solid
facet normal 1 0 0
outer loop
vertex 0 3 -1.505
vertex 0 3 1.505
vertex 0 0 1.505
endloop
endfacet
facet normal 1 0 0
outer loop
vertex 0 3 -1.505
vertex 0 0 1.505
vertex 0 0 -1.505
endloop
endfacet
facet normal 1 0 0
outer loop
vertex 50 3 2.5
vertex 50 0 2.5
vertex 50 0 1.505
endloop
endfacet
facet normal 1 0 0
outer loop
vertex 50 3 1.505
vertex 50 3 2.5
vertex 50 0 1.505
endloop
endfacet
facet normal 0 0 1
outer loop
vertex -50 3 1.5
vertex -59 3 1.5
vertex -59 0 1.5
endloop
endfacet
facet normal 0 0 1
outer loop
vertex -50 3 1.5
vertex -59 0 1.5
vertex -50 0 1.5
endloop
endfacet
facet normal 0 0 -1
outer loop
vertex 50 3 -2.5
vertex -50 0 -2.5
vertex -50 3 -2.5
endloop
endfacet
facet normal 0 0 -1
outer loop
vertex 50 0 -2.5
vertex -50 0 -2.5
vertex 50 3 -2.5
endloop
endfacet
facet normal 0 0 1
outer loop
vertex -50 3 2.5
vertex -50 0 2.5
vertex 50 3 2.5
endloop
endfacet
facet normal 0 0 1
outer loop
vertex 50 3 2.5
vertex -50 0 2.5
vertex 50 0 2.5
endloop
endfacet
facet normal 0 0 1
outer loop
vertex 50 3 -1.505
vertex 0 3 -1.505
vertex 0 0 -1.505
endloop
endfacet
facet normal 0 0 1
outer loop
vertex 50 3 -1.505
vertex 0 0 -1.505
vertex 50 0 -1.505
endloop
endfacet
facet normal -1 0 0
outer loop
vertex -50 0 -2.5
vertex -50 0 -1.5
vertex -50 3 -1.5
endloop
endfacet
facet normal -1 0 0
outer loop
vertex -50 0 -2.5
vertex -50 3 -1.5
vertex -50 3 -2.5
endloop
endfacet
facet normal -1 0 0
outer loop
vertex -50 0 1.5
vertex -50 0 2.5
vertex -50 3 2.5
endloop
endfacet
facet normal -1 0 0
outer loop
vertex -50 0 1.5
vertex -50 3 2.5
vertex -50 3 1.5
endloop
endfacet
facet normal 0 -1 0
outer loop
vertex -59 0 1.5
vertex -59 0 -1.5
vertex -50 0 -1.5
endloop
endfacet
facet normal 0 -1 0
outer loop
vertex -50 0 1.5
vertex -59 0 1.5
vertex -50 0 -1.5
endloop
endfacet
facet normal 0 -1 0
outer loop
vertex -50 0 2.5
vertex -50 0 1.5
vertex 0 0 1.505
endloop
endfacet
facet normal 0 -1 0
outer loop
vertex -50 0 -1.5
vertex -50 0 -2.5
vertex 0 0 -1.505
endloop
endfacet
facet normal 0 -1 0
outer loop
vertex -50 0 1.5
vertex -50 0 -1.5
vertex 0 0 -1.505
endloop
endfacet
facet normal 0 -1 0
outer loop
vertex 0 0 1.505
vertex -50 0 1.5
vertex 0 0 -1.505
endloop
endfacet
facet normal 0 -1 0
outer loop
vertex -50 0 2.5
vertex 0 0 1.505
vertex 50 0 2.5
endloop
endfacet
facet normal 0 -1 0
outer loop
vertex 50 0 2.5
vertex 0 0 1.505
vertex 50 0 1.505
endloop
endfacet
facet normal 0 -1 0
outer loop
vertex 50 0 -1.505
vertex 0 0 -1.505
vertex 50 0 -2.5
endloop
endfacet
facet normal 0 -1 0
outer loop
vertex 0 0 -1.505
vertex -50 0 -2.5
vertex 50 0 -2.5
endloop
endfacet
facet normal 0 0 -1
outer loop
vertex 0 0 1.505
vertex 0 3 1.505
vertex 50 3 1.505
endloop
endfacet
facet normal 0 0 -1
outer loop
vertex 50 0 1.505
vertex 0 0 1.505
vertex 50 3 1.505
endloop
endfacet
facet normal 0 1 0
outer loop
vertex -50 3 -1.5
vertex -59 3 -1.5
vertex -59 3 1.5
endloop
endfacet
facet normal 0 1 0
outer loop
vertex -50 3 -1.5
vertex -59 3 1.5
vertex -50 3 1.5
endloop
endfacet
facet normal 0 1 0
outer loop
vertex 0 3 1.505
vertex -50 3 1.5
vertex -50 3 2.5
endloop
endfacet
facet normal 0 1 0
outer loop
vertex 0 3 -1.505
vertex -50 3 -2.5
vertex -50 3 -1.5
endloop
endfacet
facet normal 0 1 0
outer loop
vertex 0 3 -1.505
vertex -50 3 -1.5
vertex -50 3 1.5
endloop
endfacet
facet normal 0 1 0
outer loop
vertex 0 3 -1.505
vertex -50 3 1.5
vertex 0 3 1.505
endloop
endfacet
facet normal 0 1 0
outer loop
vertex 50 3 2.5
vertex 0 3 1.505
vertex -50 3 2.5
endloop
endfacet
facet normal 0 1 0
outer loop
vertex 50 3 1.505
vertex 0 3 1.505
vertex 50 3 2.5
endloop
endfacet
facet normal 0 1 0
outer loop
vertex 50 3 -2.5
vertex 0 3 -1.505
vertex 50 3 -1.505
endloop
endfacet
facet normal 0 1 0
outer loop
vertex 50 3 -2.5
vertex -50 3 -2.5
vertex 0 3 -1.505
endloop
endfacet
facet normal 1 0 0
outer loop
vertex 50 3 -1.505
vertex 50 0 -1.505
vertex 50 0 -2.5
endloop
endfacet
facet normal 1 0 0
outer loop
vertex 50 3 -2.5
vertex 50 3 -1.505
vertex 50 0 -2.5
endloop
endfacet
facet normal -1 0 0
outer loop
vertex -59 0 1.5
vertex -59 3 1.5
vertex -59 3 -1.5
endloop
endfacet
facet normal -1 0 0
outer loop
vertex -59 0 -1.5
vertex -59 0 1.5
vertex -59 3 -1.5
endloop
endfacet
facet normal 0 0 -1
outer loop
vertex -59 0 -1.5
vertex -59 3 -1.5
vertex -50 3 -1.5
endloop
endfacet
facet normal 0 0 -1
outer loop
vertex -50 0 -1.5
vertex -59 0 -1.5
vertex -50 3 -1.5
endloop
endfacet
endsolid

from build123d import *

# Parameters (mm, degrees)
SKETCH1_W           = 100
SKETCH1_H           = 5
BOSS_EXTRUDE1_DEPTH = 3
SKETCH2_W           = 50
SKETCH2_H           = 3.01
CUT_EXTRUDE1_DEPTH  = 3
SKETCH3_W           = 18
SKETCH3_H           = 3
BOSS_EXTRUDE2_DEPTH = 3


with BuildPart() as part:
    # Sketch1 → Boss-Extrude1 (new body)
    with BuildSketch(Plane(origin=(0, 0, 0), x_dir=(1, 0, 0), z_dir=(0, 1, 0))):
        Rectangle(SKETCH1_W, SKETCH1_H)
    extrude(amount=BOSS_EXTRUDE1_DEPTH)

    # Sketch2 → Cut-Extrude1 (cut)
    with BuildSketch(Plane(origin=(0, 3, 0), x_dir=(1, 0, 0), z_dir=(0, 1, 0))):
        with Locations((25, 0)):
            Rectangle(SKETCH2_W, SKETCH2_H)
    extrude(amount=-CUT_EXTRUDE1_DEPTH, mode=Mode.SUBTRACT)

    # Sketch3 → Boss-Extrude2 (add)
    with BuildSketch(Plane(origin=(0, 3, 0), x_dir=(1, 0, 0), z_dir=(0, 1, 0))):
        with Locations((-50, 0)):
            Rectangle(SKETCH3_W, SKETCH3_H)
    extrude(amount=-BOSS_EXTRUDE2_DEPTH)


solid = part.part
